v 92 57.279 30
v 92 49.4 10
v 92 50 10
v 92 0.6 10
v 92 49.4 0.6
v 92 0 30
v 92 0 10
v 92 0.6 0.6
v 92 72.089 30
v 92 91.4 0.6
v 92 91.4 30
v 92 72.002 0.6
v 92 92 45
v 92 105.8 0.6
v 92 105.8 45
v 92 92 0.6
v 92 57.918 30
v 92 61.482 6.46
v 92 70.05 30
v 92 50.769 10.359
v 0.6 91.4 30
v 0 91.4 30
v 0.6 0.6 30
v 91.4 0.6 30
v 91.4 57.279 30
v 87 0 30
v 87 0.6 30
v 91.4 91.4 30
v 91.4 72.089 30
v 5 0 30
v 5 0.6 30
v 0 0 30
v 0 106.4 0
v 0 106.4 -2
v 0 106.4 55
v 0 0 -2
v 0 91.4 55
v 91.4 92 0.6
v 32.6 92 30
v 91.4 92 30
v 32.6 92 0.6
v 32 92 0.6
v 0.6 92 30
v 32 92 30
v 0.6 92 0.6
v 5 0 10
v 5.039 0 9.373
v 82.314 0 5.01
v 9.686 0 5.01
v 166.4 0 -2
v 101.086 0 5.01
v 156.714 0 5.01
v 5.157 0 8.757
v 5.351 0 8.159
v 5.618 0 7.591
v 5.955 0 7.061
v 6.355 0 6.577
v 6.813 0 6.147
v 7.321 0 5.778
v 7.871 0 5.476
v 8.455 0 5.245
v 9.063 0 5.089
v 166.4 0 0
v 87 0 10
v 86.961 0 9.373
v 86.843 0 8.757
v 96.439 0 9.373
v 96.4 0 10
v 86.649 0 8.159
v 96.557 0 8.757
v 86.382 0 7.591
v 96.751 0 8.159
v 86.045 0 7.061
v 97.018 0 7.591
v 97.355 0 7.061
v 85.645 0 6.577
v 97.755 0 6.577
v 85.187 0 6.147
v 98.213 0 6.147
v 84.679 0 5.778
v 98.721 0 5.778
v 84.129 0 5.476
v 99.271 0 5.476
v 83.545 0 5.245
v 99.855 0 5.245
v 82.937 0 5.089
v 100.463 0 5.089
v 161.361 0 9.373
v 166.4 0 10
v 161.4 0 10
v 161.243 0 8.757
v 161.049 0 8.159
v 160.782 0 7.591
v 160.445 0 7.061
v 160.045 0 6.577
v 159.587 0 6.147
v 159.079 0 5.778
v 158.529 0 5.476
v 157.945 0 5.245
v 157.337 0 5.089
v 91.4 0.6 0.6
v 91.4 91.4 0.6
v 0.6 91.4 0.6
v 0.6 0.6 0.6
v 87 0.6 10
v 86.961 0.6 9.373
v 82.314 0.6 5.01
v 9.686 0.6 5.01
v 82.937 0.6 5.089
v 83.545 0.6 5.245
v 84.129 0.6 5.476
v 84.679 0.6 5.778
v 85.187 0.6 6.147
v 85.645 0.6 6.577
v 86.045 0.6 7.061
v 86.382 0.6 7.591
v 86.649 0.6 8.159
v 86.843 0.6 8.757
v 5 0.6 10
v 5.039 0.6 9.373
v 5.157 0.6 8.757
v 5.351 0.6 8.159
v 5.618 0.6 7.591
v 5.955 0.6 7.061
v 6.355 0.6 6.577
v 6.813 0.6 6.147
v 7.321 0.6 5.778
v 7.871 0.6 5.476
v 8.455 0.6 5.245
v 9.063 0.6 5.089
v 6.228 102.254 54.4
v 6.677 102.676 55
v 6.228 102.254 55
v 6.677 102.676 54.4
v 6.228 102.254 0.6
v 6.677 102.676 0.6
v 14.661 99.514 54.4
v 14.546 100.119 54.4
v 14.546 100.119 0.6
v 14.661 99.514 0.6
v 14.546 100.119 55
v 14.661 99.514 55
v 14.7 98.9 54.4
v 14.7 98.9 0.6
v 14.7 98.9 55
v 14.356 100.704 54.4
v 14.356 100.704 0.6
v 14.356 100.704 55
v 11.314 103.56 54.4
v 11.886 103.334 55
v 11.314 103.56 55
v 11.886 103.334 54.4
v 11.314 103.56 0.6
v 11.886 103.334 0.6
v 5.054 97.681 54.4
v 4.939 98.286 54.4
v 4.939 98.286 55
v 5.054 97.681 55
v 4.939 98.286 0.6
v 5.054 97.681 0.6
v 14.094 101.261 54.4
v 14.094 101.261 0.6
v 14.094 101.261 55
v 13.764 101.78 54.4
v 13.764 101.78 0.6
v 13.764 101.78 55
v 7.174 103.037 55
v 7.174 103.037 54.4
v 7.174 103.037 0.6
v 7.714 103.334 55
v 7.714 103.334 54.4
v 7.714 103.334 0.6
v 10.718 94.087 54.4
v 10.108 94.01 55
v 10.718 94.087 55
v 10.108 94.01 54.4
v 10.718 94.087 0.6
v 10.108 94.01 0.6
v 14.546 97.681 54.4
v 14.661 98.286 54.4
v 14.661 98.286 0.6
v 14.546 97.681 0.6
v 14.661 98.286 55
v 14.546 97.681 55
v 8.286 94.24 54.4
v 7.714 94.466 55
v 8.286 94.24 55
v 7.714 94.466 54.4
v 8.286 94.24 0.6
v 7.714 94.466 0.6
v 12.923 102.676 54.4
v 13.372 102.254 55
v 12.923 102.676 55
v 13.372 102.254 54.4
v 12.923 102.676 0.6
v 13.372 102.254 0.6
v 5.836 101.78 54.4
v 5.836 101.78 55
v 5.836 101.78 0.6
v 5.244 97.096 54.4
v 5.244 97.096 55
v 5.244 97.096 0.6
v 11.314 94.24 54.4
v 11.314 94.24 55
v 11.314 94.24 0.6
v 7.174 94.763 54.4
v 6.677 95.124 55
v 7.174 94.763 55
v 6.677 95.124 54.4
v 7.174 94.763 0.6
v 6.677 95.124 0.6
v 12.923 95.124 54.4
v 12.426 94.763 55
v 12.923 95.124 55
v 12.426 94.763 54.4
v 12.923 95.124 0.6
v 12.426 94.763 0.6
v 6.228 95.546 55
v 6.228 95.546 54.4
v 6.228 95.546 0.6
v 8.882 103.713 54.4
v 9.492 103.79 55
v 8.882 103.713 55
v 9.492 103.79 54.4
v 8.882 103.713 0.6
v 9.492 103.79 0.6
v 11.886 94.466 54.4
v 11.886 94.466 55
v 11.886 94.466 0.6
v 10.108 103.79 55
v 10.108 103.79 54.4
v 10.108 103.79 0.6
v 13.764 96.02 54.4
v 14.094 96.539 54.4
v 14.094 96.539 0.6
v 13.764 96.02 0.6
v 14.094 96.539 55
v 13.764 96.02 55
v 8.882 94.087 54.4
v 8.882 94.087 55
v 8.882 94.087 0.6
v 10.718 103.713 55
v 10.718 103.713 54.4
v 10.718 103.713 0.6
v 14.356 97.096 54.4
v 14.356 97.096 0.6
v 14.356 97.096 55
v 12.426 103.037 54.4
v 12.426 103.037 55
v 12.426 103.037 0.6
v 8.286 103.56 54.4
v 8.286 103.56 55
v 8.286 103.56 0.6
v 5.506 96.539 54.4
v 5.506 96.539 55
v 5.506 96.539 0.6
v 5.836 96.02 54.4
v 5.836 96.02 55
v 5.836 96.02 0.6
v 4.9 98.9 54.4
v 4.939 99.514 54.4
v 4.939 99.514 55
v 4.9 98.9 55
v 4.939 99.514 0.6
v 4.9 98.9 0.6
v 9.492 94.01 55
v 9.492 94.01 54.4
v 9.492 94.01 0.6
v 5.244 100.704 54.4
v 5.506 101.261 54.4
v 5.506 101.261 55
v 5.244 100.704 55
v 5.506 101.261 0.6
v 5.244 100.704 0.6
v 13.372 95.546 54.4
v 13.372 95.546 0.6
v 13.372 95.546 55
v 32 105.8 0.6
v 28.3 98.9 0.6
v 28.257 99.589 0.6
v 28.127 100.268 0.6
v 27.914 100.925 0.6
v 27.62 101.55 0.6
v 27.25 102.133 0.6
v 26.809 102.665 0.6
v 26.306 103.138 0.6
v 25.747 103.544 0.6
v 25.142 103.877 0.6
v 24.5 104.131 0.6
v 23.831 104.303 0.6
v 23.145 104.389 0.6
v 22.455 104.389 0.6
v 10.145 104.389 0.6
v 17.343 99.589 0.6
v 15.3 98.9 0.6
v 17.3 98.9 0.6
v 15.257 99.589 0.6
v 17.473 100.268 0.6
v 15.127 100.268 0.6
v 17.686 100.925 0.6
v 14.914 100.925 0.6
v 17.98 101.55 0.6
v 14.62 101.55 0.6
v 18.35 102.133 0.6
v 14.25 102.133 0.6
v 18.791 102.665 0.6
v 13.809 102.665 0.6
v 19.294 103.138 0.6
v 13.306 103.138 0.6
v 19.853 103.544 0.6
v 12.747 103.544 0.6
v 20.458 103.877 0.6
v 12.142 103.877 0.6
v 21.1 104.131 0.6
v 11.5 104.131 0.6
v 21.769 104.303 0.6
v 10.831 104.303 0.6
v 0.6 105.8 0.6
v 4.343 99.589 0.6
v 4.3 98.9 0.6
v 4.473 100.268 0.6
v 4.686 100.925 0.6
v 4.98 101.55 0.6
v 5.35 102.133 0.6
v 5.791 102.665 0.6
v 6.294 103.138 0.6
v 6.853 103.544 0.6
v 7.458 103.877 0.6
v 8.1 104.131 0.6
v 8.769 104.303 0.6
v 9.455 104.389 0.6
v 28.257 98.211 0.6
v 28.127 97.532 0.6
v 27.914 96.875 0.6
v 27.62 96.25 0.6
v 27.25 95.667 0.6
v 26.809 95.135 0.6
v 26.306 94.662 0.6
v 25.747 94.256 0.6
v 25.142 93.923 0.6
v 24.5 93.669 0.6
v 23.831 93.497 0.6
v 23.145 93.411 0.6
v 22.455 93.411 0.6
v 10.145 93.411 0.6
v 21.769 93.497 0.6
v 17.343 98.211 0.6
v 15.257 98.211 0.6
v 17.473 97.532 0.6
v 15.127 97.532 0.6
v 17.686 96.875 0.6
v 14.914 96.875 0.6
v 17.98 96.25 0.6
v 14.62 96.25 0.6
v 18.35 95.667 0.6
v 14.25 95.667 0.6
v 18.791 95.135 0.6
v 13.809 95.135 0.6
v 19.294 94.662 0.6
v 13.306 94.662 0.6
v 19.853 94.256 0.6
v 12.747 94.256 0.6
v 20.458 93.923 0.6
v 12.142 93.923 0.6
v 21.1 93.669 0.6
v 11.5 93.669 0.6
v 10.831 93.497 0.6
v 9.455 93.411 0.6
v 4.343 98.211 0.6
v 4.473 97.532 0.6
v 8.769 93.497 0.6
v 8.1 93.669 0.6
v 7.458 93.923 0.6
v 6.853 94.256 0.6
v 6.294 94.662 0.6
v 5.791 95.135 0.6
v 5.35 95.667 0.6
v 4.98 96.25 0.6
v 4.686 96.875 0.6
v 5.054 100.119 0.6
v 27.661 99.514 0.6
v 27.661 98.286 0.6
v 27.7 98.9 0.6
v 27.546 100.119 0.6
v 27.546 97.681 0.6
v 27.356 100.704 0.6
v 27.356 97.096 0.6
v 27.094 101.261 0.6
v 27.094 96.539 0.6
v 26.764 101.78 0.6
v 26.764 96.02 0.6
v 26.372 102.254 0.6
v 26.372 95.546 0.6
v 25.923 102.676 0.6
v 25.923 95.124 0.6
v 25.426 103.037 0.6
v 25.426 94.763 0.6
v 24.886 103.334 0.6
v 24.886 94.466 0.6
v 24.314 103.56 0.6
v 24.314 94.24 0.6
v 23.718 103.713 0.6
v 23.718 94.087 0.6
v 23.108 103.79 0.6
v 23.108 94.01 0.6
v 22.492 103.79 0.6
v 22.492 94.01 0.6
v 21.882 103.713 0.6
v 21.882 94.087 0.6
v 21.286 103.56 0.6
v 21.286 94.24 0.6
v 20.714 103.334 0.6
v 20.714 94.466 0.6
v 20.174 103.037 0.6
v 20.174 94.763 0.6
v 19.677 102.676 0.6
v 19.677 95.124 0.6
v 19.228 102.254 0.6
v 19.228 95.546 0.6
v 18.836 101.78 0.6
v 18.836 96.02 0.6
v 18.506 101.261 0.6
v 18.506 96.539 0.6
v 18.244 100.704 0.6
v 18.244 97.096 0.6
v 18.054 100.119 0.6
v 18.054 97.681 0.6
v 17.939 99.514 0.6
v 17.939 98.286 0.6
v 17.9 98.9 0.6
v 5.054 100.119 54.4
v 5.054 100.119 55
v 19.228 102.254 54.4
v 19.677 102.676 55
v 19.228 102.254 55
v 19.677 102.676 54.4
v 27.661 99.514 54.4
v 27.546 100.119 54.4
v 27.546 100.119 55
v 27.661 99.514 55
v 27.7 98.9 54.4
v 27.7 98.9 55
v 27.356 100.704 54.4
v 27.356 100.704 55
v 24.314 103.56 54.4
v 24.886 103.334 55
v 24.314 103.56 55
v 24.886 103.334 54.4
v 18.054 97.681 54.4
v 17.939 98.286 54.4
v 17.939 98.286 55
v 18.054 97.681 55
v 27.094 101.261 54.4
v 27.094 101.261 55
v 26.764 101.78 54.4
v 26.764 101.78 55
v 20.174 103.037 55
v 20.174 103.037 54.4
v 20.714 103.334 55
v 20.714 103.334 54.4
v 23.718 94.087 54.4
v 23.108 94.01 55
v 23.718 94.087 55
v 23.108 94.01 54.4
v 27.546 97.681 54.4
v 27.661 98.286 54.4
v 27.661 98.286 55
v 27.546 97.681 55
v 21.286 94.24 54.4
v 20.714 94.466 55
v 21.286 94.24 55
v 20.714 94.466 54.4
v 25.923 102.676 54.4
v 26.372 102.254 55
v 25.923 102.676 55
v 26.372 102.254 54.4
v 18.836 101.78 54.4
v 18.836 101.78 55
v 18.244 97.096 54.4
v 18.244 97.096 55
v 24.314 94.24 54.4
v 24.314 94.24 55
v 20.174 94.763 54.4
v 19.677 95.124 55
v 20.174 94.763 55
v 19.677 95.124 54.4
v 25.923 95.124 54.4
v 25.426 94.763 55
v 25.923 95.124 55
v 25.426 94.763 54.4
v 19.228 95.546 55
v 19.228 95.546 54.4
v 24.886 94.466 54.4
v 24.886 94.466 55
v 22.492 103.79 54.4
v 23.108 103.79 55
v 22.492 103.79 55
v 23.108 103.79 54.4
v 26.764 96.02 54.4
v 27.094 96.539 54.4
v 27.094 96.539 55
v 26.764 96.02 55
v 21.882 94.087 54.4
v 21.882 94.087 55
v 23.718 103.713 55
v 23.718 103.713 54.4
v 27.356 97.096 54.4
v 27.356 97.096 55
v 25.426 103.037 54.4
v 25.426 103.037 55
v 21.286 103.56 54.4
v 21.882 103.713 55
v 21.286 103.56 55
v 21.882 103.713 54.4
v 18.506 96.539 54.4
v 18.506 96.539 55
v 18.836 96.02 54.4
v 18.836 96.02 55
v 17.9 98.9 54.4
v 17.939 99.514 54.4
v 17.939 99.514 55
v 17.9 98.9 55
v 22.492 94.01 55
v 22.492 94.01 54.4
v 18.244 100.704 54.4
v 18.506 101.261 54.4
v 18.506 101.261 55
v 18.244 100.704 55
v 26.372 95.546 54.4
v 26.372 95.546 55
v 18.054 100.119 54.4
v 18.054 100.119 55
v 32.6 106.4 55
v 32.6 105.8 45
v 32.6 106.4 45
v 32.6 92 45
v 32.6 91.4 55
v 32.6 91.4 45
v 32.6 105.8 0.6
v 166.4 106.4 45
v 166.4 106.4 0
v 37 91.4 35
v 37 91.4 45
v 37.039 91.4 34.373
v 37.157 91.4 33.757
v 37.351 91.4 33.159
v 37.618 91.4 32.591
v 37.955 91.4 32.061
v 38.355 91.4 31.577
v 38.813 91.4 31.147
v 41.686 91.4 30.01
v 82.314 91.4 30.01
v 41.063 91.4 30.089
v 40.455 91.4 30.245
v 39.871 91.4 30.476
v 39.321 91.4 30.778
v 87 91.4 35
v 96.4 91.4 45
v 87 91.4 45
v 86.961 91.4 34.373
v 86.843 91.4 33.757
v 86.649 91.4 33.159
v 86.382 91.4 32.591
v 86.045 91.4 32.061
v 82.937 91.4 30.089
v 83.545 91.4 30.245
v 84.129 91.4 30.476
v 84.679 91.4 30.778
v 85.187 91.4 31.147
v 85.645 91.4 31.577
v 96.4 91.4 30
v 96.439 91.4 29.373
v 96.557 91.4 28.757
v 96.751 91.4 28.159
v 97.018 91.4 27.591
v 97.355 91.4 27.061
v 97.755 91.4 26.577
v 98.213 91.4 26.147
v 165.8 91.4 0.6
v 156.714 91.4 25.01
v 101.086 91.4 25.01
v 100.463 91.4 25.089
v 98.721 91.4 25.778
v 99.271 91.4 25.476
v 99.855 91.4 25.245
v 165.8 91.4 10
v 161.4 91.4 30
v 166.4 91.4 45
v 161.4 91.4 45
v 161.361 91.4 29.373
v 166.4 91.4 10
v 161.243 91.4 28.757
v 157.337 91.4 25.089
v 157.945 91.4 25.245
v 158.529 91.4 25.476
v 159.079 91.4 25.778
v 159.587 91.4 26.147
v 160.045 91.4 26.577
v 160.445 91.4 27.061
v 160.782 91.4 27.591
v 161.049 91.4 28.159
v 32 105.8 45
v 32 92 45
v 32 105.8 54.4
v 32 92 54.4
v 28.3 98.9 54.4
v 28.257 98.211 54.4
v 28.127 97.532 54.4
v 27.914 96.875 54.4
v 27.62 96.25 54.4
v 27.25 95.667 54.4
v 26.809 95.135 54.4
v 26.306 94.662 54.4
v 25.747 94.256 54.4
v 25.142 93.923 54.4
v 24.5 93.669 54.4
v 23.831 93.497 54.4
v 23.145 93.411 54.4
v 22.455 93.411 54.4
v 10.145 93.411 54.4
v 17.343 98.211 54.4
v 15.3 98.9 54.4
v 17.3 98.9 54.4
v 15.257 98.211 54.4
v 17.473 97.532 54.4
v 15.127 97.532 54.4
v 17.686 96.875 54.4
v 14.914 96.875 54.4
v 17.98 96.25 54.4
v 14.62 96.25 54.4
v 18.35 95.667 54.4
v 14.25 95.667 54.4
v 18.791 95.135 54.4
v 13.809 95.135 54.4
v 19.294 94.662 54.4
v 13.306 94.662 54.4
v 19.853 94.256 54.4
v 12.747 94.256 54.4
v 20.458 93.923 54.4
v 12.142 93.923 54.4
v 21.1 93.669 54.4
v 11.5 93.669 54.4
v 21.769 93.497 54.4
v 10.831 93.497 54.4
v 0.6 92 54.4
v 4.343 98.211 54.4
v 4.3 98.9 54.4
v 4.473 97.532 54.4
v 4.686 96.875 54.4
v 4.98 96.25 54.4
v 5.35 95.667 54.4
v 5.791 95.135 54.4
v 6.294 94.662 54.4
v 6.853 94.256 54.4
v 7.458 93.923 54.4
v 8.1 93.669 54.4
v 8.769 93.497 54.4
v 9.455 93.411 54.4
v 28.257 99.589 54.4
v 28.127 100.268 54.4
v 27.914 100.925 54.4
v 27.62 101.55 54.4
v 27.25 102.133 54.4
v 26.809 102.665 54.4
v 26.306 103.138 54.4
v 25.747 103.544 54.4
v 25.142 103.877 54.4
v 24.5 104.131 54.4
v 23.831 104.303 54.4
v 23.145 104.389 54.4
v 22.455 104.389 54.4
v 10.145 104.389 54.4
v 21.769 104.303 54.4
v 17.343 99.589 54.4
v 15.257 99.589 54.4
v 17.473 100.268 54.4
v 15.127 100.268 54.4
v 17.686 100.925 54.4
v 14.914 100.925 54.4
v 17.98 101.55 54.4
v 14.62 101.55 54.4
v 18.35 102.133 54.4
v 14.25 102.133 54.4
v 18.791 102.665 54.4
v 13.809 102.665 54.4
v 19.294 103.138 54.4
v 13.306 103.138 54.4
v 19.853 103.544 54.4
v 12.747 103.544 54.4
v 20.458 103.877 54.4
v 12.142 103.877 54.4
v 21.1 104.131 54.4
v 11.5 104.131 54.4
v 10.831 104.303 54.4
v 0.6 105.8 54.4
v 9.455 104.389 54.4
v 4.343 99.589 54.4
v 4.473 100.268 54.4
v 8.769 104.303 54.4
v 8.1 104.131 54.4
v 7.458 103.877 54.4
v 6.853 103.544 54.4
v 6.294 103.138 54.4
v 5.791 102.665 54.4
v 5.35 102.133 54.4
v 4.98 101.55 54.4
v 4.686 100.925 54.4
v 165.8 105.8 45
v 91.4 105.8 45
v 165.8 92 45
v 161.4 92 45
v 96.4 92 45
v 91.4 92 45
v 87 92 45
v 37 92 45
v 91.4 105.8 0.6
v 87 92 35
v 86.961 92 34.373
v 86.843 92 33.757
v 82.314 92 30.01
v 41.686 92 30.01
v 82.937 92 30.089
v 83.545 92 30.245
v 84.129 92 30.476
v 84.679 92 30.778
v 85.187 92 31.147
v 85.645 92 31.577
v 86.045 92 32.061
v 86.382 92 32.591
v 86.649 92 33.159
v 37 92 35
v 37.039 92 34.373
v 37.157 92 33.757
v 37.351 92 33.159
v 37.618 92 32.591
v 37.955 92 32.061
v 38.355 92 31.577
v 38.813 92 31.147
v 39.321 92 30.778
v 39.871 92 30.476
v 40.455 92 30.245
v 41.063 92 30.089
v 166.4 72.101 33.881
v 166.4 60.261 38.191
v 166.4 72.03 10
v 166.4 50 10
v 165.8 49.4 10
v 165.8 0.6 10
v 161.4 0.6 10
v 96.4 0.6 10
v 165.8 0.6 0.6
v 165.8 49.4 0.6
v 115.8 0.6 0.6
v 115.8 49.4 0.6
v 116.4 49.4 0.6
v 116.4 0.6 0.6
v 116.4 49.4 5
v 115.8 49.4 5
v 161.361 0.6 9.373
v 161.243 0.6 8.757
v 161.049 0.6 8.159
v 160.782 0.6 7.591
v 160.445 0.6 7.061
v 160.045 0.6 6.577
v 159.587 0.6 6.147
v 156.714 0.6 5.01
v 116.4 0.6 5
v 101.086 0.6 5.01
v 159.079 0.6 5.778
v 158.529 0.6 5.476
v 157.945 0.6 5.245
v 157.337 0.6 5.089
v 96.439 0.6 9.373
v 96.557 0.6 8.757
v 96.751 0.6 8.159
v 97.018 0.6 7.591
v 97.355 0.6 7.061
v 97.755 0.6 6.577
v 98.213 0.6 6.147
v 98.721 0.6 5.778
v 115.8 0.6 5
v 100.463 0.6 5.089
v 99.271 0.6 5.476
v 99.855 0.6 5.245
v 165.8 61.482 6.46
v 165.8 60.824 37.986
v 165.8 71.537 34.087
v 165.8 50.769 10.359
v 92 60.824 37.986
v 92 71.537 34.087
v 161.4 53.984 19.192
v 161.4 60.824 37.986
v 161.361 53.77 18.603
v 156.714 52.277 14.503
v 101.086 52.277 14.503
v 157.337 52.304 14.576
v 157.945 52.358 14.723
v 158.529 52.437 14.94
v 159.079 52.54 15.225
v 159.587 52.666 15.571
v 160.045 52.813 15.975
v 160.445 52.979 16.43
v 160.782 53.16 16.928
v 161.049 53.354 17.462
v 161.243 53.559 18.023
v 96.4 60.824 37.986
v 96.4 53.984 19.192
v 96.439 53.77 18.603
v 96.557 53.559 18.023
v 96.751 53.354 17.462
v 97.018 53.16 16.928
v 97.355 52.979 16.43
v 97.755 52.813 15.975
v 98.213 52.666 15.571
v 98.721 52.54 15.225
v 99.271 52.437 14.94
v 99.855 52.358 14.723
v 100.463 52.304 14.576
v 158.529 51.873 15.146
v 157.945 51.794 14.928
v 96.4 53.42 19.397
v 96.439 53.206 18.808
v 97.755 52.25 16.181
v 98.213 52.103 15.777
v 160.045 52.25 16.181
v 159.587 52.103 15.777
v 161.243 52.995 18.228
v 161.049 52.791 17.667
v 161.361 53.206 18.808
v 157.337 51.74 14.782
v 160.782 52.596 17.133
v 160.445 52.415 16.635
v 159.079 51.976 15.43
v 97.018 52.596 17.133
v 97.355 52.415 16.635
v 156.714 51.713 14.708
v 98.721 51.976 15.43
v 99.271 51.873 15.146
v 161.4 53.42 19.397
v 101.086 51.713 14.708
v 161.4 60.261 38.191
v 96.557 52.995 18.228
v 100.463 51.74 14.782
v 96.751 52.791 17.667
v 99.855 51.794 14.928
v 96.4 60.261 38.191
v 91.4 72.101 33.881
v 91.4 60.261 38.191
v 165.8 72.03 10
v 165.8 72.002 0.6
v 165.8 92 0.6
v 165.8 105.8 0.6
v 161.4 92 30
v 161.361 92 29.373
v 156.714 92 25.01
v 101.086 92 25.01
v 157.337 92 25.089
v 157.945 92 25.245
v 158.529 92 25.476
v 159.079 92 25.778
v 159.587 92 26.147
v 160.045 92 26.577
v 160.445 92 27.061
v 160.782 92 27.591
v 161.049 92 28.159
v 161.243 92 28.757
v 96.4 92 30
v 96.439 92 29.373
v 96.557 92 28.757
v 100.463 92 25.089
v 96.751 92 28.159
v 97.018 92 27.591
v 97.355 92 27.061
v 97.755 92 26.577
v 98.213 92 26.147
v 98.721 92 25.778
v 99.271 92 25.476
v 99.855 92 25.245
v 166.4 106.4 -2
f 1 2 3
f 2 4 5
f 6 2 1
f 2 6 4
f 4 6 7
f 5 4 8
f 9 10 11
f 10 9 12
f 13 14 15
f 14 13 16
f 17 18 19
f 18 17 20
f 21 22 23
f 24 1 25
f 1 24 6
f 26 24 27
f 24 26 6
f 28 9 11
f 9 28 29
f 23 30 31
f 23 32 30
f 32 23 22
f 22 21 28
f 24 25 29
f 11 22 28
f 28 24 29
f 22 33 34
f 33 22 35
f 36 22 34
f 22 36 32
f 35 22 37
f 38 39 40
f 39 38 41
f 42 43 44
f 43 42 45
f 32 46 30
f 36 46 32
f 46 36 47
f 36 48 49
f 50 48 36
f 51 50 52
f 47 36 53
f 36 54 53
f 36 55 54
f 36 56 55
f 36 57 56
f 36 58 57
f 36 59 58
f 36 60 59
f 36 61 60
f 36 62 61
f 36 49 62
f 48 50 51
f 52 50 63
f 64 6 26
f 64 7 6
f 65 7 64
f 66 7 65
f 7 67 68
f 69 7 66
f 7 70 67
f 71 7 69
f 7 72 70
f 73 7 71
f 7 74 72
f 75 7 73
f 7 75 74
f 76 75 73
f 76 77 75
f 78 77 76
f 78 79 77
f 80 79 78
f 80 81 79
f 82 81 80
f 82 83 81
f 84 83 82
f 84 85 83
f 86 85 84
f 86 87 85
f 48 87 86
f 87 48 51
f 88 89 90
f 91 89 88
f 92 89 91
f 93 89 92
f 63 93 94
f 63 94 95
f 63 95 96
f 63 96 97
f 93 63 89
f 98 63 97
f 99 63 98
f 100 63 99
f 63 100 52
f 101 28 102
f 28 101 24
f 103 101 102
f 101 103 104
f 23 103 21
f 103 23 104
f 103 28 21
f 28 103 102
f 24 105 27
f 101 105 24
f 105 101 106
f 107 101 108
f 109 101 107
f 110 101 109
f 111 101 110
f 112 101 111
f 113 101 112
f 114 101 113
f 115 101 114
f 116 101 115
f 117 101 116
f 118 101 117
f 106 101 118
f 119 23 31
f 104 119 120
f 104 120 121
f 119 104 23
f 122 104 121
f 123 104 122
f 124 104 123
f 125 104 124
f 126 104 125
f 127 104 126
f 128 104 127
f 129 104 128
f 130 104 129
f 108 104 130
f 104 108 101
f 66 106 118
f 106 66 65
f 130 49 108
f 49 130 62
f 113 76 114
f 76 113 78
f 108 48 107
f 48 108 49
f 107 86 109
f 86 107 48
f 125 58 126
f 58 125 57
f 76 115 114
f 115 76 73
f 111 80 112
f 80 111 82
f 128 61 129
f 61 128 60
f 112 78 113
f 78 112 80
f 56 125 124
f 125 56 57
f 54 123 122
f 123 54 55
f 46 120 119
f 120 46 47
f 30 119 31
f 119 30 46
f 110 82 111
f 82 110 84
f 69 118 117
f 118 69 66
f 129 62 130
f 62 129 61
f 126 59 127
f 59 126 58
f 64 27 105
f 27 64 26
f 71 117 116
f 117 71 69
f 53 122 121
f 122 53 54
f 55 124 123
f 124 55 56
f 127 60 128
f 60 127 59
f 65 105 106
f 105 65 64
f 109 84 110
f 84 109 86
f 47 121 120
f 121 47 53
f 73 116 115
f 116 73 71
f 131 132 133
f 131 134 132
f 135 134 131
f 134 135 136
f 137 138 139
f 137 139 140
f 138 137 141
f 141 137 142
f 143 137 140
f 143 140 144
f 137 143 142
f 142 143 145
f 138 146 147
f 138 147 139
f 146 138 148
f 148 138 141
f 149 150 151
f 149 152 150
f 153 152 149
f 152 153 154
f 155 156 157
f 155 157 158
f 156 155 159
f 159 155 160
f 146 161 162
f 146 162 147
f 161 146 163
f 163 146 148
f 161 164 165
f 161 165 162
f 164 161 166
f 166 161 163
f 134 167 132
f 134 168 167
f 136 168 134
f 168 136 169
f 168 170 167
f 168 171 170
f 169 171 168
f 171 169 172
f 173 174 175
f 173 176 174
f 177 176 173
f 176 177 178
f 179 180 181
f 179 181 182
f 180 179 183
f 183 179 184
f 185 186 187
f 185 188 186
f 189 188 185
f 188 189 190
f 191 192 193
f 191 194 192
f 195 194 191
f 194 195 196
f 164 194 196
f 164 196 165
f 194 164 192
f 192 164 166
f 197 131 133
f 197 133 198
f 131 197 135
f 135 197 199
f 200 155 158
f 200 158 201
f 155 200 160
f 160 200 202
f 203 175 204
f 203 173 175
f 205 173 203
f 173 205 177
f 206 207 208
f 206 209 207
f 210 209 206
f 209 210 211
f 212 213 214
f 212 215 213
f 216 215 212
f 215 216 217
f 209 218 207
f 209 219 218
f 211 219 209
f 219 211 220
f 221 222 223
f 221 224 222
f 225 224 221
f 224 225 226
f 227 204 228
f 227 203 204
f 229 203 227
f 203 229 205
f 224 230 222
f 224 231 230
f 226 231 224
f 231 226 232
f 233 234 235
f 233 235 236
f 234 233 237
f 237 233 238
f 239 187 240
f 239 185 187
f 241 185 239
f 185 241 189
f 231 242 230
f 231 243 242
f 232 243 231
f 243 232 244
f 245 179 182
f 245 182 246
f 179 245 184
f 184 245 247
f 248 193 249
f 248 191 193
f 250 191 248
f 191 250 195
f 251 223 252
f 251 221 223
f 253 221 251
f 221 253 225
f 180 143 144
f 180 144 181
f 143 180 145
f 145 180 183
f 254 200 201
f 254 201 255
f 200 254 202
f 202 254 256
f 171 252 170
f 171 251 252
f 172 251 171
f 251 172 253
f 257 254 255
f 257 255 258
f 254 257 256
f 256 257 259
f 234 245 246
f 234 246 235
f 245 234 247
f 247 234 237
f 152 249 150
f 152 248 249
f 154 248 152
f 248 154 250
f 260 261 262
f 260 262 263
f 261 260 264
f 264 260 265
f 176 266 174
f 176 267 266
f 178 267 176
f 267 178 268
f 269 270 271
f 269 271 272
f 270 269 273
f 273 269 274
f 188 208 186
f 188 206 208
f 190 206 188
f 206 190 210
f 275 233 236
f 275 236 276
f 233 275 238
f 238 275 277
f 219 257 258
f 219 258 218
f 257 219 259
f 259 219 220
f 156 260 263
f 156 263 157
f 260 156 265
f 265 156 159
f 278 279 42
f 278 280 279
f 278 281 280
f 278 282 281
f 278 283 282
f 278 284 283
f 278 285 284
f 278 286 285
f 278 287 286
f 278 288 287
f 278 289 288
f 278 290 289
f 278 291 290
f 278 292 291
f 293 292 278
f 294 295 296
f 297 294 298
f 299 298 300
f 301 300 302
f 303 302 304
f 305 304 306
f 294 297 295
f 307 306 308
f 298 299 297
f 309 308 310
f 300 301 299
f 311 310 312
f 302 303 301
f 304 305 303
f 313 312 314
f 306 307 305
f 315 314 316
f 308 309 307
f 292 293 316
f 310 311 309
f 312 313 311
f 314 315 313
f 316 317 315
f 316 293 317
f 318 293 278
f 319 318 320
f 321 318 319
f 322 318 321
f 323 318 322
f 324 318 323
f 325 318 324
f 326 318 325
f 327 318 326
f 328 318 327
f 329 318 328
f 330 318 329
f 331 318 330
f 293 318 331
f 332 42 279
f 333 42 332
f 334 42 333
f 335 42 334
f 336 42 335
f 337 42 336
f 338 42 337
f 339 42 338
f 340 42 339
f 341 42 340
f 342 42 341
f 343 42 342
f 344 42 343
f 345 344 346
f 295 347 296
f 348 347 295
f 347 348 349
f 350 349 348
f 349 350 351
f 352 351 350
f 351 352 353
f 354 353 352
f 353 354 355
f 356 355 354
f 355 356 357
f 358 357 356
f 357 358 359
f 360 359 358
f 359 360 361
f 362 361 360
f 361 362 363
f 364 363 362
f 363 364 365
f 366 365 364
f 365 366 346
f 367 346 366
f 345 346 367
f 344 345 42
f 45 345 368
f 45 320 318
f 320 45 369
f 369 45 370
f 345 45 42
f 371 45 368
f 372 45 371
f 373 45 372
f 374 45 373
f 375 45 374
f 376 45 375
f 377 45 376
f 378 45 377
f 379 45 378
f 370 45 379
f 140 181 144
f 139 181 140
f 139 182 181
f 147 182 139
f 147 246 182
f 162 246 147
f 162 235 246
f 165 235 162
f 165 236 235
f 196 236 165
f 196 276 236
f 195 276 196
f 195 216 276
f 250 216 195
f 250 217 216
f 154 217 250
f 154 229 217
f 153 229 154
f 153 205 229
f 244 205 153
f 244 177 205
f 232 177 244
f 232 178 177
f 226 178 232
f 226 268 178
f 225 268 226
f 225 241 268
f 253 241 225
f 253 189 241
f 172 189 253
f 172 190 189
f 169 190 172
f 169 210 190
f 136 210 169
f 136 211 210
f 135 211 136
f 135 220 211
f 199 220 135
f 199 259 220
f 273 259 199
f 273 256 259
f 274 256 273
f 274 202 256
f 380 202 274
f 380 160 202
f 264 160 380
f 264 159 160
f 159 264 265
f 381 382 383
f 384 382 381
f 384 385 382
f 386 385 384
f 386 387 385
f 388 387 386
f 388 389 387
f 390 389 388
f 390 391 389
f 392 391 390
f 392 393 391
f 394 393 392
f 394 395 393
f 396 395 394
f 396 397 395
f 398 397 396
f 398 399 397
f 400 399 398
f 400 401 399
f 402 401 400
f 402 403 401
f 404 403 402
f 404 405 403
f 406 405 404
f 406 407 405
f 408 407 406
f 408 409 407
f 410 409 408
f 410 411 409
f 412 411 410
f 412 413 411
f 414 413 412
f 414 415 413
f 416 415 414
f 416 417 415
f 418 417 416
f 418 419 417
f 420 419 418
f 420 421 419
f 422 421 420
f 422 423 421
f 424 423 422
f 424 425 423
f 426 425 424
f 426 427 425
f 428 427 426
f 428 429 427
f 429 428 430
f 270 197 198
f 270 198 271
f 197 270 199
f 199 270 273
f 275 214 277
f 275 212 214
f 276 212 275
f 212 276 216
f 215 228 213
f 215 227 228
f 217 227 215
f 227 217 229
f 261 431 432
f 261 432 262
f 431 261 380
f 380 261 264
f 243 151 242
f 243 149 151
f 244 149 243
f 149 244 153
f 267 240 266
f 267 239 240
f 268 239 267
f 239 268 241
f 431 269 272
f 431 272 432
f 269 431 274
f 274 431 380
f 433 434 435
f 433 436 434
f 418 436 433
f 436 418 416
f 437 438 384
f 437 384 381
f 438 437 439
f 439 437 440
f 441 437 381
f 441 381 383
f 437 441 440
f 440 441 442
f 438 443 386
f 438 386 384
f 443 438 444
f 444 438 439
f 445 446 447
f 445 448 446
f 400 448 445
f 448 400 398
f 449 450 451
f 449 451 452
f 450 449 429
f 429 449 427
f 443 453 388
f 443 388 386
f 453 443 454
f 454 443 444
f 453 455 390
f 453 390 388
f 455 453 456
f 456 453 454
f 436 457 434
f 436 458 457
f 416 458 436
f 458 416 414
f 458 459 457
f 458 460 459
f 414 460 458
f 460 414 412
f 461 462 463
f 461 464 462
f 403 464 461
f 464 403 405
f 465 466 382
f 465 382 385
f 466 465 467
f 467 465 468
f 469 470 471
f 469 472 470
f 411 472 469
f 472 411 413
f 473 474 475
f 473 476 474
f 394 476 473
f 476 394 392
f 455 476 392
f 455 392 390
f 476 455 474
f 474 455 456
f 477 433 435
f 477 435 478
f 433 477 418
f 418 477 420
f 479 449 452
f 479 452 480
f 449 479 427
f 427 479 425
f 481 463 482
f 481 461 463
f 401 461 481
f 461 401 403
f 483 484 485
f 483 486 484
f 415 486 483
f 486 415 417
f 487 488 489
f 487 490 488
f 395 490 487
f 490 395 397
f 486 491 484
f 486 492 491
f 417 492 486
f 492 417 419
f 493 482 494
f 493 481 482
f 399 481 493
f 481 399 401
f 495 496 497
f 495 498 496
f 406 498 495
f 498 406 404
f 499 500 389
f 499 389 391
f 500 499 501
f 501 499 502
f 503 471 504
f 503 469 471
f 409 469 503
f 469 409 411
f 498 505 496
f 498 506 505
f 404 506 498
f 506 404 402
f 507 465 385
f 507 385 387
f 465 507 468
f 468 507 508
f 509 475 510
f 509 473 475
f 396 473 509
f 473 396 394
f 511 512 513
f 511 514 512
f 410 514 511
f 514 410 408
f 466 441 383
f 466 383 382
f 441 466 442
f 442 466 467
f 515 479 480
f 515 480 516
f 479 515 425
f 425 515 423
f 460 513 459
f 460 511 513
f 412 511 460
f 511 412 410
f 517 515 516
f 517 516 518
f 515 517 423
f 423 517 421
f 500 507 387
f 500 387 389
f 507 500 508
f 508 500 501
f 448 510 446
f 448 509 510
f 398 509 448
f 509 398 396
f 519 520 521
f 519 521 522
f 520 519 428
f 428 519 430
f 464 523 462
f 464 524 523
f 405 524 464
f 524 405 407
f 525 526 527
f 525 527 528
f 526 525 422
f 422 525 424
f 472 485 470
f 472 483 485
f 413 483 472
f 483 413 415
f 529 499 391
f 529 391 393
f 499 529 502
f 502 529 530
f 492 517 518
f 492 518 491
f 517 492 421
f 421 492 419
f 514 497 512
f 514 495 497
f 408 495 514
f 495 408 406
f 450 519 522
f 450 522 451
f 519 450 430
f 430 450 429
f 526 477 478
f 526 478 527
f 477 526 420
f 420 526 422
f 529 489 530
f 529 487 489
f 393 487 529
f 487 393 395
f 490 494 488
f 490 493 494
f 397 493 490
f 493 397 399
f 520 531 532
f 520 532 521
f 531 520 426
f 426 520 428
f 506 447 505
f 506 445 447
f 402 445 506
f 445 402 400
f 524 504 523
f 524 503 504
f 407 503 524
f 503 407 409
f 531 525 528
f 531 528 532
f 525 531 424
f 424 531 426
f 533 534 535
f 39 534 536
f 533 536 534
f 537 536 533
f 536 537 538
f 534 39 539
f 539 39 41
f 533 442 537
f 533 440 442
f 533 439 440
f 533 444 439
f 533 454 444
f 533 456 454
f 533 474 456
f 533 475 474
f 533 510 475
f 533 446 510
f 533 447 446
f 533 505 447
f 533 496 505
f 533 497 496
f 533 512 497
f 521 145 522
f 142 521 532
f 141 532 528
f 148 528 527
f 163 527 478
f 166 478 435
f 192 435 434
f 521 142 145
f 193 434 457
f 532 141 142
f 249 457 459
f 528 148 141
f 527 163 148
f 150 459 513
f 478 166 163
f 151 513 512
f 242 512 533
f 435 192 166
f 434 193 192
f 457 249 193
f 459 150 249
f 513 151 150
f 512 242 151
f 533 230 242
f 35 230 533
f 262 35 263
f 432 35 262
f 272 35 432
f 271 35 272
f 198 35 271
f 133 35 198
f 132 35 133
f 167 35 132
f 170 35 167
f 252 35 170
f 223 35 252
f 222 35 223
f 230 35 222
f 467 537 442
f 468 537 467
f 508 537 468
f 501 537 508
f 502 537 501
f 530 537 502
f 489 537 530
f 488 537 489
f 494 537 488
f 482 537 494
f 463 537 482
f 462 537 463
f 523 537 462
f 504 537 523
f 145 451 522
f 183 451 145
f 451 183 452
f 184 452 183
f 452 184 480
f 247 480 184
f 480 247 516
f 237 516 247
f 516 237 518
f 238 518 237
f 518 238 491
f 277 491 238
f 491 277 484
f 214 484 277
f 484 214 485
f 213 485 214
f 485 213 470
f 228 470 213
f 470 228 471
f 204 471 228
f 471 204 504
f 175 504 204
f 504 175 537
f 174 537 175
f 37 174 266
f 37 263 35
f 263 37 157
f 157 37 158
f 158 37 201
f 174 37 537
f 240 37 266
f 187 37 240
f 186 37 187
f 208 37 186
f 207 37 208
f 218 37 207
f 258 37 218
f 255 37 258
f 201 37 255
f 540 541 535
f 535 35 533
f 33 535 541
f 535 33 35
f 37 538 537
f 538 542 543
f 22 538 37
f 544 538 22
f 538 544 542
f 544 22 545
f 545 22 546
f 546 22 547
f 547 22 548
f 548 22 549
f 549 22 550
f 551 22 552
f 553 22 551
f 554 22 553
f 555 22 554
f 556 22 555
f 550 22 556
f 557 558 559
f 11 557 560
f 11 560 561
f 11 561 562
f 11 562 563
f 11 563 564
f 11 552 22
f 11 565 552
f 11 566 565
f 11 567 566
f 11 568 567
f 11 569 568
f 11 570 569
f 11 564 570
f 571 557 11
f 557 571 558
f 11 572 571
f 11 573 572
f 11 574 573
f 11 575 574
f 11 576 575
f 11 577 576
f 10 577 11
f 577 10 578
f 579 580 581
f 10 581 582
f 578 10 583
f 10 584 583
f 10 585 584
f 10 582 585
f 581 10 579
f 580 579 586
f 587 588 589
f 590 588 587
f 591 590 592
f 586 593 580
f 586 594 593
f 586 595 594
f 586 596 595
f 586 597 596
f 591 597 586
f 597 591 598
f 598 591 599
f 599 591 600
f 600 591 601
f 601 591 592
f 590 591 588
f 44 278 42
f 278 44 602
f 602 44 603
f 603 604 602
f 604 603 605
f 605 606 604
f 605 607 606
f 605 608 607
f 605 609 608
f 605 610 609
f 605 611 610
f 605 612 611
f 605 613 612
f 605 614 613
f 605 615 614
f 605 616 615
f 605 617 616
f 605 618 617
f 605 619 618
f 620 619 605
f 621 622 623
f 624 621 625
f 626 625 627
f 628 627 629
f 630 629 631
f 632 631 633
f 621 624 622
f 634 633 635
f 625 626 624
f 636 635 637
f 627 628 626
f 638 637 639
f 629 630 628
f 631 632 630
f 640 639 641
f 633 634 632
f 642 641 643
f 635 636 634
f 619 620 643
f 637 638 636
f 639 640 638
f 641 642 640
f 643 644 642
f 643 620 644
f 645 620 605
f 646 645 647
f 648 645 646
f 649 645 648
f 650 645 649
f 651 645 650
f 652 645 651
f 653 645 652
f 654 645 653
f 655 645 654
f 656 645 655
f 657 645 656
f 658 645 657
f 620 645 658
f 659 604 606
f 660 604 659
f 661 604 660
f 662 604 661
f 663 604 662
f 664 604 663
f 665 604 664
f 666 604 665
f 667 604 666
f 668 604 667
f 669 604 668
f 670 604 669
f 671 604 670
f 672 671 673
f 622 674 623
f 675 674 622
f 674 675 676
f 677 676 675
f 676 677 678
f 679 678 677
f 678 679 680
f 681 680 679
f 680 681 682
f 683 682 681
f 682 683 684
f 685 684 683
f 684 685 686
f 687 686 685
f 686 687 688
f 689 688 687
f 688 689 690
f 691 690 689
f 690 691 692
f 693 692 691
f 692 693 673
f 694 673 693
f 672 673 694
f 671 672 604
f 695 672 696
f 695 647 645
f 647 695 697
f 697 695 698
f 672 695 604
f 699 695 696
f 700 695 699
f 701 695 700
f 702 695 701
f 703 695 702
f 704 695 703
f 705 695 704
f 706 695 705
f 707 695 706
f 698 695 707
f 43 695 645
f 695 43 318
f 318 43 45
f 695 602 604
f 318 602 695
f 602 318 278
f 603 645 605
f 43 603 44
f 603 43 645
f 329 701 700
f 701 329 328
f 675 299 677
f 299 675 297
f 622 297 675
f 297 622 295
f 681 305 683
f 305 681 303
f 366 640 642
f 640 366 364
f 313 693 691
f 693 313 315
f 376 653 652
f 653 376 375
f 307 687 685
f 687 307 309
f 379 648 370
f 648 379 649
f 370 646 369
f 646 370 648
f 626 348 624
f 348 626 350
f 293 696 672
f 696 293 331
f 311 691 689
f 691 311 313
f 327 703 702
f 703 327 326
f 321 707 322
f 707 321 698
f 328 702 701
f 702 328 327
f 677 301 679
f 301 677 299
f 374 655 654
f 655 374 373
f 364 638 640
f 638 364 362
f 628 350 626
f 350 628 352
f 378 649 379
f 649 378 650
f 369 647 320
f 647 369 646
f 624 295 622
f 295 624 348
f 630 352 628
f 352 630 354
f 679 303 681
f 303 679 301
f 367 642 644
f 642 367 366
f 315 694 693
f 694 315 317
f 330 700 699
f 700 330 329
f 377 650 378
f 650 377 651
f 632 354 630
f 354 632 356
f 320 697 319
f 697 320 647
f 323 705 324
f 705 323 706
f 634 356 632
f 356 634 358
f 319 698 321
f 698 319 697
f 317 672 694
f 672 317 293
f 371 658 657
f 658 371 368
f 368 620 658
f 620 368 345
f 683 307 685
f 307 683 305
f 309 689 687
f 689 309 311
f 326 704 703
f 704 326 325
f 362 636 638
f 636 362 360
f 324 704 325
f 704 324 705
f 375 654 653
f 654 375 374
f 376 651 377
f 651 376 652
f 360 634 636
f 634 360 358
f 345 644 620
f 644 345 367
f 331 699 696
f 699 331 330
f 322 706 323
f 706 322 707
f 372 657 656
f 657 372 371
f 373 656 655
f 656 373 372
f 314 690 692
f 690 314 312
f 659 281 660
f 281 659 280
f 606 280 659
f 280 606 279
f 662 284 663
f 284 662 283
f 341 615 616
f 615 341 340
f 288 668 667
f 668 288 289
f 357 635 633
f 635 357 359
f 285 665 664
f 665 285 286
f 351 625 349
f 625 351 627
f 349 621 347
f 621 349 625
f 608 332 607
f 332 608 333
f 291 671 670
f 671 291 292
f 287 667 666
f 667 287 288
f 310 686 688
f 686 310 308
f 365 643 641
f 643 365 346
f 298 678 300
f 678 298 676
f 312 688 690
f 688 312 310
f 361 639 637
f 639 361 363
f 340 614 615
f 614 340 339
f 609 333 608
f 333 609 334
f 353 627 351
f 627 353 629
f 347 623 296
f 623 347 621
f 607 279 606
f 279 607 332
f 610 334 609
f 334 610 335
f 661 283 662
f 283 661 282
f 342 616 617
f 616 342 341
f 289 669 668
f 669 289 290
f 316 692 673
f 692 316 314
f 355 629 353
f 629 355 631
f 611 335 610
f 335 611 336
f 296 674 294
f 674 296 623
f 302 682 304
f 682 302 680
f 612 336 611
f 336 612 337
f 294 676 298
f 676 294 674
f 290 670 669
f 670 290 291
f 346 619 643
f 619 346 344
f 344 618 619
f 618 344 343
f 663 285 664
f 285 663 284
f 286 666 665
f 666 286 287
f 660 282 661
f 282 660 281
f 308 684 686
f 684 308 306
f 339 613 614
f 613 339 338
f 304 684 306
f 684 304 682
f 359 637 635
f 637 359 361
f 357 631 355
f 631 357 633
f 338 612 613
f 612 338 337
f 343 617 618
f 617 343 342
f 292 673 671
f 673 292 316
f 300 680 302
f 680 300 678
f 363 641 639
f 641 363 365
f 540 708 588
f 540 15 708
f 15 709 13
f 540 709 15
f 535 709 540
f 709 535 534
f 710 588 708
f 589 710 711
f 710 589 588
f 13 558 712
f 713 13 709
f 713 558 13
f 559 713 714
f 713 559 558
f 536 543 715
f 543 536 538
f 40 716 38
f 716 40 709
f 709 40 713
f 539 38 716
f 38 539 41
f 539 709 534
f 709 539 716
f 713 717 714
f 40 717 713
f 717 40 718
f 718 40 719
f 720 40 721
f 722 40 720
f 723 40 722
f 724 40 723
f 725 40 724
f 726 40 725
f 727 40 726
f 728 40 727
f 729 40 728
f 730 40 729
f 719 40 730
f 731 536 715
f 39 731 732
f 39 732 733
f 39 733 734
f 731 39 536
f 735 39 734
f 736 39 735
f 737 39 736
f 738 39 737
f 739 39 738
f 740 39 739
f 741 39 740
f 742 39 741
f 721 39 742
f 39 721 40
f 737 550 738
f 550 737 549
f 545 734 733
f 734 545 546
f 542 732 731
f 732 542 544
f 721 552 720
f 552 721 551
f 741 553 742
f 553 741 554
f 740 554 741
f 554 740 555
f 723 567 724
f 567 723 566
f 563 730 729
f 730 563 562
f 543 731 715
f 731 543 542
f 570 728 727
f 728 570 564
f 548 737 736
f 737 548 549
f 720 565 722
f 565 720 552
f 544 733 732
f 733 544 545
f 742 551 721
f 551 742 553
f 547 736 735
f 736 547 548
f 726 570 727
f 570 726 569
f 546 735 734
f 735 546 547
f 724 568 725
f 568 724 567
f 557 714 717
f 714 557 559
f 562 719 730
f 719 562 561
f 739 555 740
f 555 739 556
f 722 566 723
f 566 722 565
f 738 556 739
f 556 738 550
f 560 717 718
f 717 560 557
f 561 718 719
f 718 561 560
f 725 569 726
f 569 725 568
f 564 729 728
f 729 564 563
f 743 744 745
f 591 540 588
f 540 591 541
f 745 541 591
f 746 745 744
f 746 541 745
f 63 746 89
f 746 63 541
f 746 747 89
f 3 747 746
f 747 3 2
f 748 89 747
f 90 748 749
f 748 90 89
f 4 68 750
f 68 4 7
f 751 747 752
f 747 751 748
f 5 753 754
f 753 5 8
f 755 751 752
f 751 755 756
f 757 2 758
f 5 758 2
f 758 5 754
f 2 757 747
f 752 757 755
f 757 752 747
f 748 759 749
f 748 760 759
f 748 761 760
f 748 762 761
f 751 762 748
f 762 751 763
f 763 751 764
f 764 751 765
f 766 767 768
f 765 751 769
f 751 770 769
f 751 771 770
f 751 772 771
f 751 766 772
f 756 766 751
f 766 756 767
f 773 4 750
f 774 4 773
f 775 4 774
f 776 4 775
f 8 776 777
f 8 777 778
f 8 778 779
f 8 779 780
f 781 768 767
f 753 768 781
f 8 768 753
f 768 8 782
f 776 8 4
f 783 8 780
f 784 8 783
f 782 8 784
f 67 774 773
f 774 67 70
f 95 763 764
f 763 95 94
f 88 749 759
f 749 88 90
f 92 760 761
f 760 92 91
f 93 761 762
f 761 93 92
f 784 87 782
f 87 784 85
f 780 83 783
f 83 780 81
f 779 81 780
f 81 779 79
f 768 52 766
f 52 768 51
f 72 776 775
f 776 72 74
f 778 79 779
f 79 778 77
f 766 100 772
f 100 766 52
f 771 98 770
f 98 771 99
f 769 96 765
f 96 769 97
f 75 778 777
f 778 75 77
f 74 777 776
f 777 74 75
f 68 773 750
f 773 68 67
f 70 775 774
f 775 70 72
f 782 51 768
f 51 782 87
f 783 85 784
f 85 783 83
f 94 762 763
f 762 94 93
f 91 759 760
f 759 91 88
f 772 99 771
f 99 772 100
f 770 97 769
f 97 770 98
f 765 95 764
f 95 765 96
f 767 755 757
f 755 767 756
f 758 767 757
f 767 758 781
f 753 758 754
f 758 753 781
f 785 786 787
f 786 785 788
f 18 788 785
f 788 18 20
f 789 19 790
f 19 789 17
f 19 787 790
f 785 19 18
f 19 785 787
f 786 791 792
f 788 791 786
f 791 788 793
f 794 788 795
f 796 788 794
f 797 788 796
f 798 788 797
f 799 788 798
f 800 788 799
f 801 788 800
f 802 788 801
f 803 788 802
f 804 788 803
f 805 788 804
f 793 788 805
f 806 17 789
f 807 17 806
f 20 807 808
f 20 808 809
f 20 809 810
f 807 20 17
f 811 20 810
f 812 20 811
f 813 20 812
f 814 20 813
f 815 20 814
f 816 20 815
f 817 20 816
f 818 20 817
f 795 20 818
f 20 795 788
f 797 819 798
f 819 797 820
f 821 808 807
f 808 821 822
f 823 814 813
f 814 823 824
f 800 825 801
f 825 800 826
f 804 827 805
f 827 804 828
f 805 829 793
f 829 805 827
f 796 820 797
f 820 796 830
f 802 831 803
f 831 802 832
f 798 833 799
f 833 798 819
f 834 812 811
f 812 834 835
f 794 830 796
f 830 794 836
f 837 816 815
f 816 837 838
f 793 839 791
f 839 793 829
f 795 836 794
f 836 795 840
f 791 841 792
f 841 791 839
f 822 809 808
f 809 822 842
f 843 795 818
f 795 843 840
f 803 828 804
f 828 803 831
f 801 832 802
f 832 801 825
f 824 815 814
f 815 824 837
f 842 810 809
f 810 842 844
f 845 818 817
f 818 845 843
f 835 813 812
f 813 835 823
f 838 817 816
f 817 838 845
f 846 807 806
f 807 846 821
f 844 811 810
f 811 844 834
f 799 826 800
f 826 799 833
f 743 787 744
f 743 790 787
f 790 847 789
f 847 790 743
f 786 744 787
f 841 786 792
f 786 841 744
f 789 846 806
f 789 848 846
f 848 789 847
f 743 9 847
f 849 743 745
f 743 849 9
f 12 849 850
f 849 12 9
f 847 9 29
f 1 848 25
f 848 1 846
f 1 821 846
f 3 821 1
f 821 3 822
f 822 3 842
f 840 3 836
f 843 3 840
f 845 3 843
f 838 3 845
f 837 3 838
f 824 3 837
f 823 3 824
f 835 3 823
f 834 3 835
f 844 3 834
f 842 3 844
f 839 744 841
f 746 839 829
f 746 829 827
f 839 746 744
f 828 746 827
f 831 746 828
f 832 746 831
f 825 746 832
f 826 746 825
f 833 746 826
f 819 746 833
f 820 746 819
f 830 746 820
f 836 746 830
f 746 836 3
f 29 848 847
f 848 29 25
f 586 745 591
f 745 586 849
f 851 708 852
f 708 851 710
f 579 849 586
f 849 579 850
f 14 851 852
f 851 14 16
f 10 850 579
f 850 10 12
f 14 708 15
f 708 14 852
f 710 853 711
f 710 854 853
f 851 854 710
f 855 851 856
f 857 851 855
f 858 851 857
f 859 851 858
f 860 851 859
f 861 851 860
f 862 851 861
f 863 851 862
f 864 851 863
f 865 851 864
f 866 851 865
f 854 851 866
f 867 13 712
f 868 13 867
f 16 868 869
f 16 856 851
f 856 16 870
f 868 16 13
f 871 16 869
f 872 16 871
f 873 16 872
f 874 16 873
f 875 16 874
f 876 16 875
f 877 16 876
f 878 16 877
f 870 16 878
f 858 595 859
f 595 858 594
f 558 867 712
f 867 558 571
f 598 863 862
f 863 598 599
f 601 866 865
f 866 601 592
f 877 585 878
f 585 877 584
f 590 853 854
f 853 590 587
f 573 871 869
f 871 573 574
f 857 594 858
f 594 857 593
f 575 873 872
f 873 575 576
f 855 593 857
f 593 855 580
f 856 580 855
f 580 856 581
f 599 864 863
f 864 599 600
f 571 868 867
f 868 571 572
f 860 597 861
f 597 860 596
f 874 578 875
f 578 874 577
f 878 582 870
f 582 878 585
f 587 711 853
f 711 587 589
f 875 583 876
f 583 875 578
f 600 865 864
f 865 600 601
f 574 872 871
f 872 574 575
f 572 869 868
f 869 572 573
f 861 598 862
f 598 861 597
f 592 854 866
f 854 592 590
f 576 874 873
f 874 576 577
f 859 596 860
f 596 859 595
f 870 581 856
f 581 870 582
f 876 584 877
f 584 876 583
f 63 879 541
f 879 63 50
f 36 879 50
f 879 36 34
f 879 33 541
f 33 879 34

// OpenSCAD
$fn = 50;
thickness = 0.6;
roundness = 5;
cover=5;


module box(size = [56, 15, 90], thickness = thickness, cover=cover, center = false) {
  x = size[0];
  y = size[1];
  z = size[2];
  t = thickness;
  dt = thickness * 2;

  difference() {
    cube([x, y, z]);
    translate([t, t, t])
      cube([x - dt, y - dt, z]);
  }
}
module open_box(size = [56, 15, 90], thickness = thickness, cover=cover, center = false, hole_start=cover) {
  x = size[0];
  y = size[1];
  z = size[2];
  t = thickness;
  dt = thickness * 2;
  ht = thickness / 2;
  cov = cover + roundness;
  hstart = hole_start + roundness;
  hcov = cov / 2;
  dcov = cov * 2;

  difference() {
    box([x, y, z])
    translate([t, t, t])
      cube([x - dt, y - dt, z]);

    rotate(90, [1, 0, 0])
      translate([cov, hstart, -t-ht])
        hull() {
          cylinder(dt, r=roundness);
          translate([x - dcov, 0, 0])
            cylinder(dt, r=roundness);
          translate([x - dcov, z, 0])
            cylinder(dt, r=roundness);
          translate([0,z,0])
            cylinder(dt, r=roundness);
        }
  }
}

module pen_holder(size = [56, 15, 90], hole = 10, space = 10, thickness = thickness, cover=cover, center = false) {
  x = size[0];
  y = size[1];
  z = size[2];
  t = thickness;
  dt = thickness * 2;
  rhole = hole / 2;

  hole_no = floor(x / (hole + space));
  margin = (x - (((hole + space) * hole_no) - space)) / 2;

  difference() {
    cube([x, y, z]);
    translate([t, t, t])
      cube([x - dt, y - dt, z-dt]);

    for (offset_ = [0 : space + hole : x - hole - space]) {
      translate([margin + rhole + offset_, y / 2, t])
        cylinder(z, r=rhole - t);
    }
  }

  difference() {
    union() {
      for (offset_ = [0 : space + hole : x - hole - space]) {
        translate([margin + rhole + offset_, y / 2, t])
          cylinder(z-t, r=rhole);
      }
    }
    for (offset_ = [0 : space + hole : x - hole - space]) {
      translate([margin + rhole + offset_, y / 2, t])
        cylinder(z, r=rhole - t);
    }
  }
}

module business_card_holder(size = [56, 15, 90], thickness = thickness, cover=cover, center = false, hole_start=cover) {
  x = size[0];
  y = size[1];
  z = size[2];
  open_box([x, y, z], hole_start=hole_start);
}

module paper_holder(size = [90, 90, 40], thickness = thickness, cover=cover, center = false) {
  x = size[0];
  y = size[1];
  z = size[2];
  open_box([x, y, z]);
}

module phone_holder(height = 15) {
  x = 75;
  y = 12.6;
  z = 30;
  t = thickness;
  dt = thickness * 2;
  ht = thickness / 2;
  cov = cover + roundness;
  hstart = cover + roundness;
  hcov = cov / 2;
  dcov = cov * 2;

  difference() {
    hull() {
      rotate(-20, [1, 0, 0])
      box([x, y, z]);
      translate([0, 0, - height])
        cube([75, 22, 5]);
    }
    rotate(-20, [1, 0, 0]) {
        translate([t, t, t])
          cube([x - dt, y - dt, z]);
        rotate(90, [1, 0, 0])
          translate([cov, hstart, -t-ht])
            hull() {
              cylinder(dt, r=roundness);
              translate([x - dcov, 0, 0])
                cylinder(dt, r=roundness);
              translate([x - dcov, z, 0])
                cylinder(dt, r=roundness);
              translate([0,z,0])
                cylinder(dt, r=roundness);
            }
    }
  }
}

module usbsdholder(size = [90, 35, 15], deep=10) {
  x = size[0];
  y = size[1];
  z = size[2];
  module block(size = size) {
    x = size[0];
    y = size[1];
    z = size[2];
    dr = roundness * 2;
    hull() {
        translate([0, y - roundness, z - roundness])
          rotate(90, [0,1,0])
            cylinder(x - roundness, r=roundness);
        translate([x - roundness, 0, z - roundness])
          rotate(90, [-1,0,0])
            cylinder(y - roundness, r=roundness);
        translate([x - roundness, y - roundness, z - roundness])
          sphere(roundness);
        cube([x, y, z - roundness]);
        translate([0, 0, roundness])
          cube([x/2, y/2, z-roundness]);
      }
  }
  module usb(size = [5, 12.5, 10]) {
    cube(size);
  }
  module sd(size = [2.5, 24.5, 10]) {
    x = size[0];
    y = size[1];
    z = size[2];
    cube(size);
    translate([x/2, 0, 0]) {
      cylinder(z, r=x);
      translate([0, y, 0])
        cylinder(z, r=x);
    }
  }
  module microsd(size = [1.1, 11.5, 10]) {
    x = size[0];
    y = size[1];
    z = size[2];
    cube(size);
    translate([x/2, 0, 0]) {
      cylinder(z, r=x);
      translate([0, y, 0])
        cylinder(z, r=x);
    }
  }

  layer = 0.2;

  difference() {
    block();
    translate([5, 11, (z - deep) + layer]) {
      usb();
      translate([1.2, -6, 0])
        sd();
      translate([8.2, 2, 0])
        rotate(90, [0,0,1])
          microsd();
    }
  }
}

/* !usbsdholder(); */

paper_holder([92, 92, 30]);
translate([0, 92 - thickness, 0])
  pen_holder([32+thickness, 15, 55], hole=11, space=2);

translate([32, 92 - thickness, 0])
  business_card_holder([60, 15, 45], hole=11, space=2, hole_start=30);

translate([92 - thickness, 0, 0])
  open_box([75, 50, 10], hole=11, space=2);

translate([92 - thickness, 0, 0])
  box([25, 50, 5], hole=11, space=2);

translate([92 - thickness, 50, 10])
  phone_holder(height=10);

translate([92 - thickness, 70-thickness, 0])
  box([75, 37, 10], hole=11, space=2);

translate([92 - thickness, 92-thickness, 0])
  open_box([75, 15, 45], hole=11, space=2, hole_start=25);

translate([0, 0, -2])
  cube([167 - thickness, 107 - thickness ,2]);
